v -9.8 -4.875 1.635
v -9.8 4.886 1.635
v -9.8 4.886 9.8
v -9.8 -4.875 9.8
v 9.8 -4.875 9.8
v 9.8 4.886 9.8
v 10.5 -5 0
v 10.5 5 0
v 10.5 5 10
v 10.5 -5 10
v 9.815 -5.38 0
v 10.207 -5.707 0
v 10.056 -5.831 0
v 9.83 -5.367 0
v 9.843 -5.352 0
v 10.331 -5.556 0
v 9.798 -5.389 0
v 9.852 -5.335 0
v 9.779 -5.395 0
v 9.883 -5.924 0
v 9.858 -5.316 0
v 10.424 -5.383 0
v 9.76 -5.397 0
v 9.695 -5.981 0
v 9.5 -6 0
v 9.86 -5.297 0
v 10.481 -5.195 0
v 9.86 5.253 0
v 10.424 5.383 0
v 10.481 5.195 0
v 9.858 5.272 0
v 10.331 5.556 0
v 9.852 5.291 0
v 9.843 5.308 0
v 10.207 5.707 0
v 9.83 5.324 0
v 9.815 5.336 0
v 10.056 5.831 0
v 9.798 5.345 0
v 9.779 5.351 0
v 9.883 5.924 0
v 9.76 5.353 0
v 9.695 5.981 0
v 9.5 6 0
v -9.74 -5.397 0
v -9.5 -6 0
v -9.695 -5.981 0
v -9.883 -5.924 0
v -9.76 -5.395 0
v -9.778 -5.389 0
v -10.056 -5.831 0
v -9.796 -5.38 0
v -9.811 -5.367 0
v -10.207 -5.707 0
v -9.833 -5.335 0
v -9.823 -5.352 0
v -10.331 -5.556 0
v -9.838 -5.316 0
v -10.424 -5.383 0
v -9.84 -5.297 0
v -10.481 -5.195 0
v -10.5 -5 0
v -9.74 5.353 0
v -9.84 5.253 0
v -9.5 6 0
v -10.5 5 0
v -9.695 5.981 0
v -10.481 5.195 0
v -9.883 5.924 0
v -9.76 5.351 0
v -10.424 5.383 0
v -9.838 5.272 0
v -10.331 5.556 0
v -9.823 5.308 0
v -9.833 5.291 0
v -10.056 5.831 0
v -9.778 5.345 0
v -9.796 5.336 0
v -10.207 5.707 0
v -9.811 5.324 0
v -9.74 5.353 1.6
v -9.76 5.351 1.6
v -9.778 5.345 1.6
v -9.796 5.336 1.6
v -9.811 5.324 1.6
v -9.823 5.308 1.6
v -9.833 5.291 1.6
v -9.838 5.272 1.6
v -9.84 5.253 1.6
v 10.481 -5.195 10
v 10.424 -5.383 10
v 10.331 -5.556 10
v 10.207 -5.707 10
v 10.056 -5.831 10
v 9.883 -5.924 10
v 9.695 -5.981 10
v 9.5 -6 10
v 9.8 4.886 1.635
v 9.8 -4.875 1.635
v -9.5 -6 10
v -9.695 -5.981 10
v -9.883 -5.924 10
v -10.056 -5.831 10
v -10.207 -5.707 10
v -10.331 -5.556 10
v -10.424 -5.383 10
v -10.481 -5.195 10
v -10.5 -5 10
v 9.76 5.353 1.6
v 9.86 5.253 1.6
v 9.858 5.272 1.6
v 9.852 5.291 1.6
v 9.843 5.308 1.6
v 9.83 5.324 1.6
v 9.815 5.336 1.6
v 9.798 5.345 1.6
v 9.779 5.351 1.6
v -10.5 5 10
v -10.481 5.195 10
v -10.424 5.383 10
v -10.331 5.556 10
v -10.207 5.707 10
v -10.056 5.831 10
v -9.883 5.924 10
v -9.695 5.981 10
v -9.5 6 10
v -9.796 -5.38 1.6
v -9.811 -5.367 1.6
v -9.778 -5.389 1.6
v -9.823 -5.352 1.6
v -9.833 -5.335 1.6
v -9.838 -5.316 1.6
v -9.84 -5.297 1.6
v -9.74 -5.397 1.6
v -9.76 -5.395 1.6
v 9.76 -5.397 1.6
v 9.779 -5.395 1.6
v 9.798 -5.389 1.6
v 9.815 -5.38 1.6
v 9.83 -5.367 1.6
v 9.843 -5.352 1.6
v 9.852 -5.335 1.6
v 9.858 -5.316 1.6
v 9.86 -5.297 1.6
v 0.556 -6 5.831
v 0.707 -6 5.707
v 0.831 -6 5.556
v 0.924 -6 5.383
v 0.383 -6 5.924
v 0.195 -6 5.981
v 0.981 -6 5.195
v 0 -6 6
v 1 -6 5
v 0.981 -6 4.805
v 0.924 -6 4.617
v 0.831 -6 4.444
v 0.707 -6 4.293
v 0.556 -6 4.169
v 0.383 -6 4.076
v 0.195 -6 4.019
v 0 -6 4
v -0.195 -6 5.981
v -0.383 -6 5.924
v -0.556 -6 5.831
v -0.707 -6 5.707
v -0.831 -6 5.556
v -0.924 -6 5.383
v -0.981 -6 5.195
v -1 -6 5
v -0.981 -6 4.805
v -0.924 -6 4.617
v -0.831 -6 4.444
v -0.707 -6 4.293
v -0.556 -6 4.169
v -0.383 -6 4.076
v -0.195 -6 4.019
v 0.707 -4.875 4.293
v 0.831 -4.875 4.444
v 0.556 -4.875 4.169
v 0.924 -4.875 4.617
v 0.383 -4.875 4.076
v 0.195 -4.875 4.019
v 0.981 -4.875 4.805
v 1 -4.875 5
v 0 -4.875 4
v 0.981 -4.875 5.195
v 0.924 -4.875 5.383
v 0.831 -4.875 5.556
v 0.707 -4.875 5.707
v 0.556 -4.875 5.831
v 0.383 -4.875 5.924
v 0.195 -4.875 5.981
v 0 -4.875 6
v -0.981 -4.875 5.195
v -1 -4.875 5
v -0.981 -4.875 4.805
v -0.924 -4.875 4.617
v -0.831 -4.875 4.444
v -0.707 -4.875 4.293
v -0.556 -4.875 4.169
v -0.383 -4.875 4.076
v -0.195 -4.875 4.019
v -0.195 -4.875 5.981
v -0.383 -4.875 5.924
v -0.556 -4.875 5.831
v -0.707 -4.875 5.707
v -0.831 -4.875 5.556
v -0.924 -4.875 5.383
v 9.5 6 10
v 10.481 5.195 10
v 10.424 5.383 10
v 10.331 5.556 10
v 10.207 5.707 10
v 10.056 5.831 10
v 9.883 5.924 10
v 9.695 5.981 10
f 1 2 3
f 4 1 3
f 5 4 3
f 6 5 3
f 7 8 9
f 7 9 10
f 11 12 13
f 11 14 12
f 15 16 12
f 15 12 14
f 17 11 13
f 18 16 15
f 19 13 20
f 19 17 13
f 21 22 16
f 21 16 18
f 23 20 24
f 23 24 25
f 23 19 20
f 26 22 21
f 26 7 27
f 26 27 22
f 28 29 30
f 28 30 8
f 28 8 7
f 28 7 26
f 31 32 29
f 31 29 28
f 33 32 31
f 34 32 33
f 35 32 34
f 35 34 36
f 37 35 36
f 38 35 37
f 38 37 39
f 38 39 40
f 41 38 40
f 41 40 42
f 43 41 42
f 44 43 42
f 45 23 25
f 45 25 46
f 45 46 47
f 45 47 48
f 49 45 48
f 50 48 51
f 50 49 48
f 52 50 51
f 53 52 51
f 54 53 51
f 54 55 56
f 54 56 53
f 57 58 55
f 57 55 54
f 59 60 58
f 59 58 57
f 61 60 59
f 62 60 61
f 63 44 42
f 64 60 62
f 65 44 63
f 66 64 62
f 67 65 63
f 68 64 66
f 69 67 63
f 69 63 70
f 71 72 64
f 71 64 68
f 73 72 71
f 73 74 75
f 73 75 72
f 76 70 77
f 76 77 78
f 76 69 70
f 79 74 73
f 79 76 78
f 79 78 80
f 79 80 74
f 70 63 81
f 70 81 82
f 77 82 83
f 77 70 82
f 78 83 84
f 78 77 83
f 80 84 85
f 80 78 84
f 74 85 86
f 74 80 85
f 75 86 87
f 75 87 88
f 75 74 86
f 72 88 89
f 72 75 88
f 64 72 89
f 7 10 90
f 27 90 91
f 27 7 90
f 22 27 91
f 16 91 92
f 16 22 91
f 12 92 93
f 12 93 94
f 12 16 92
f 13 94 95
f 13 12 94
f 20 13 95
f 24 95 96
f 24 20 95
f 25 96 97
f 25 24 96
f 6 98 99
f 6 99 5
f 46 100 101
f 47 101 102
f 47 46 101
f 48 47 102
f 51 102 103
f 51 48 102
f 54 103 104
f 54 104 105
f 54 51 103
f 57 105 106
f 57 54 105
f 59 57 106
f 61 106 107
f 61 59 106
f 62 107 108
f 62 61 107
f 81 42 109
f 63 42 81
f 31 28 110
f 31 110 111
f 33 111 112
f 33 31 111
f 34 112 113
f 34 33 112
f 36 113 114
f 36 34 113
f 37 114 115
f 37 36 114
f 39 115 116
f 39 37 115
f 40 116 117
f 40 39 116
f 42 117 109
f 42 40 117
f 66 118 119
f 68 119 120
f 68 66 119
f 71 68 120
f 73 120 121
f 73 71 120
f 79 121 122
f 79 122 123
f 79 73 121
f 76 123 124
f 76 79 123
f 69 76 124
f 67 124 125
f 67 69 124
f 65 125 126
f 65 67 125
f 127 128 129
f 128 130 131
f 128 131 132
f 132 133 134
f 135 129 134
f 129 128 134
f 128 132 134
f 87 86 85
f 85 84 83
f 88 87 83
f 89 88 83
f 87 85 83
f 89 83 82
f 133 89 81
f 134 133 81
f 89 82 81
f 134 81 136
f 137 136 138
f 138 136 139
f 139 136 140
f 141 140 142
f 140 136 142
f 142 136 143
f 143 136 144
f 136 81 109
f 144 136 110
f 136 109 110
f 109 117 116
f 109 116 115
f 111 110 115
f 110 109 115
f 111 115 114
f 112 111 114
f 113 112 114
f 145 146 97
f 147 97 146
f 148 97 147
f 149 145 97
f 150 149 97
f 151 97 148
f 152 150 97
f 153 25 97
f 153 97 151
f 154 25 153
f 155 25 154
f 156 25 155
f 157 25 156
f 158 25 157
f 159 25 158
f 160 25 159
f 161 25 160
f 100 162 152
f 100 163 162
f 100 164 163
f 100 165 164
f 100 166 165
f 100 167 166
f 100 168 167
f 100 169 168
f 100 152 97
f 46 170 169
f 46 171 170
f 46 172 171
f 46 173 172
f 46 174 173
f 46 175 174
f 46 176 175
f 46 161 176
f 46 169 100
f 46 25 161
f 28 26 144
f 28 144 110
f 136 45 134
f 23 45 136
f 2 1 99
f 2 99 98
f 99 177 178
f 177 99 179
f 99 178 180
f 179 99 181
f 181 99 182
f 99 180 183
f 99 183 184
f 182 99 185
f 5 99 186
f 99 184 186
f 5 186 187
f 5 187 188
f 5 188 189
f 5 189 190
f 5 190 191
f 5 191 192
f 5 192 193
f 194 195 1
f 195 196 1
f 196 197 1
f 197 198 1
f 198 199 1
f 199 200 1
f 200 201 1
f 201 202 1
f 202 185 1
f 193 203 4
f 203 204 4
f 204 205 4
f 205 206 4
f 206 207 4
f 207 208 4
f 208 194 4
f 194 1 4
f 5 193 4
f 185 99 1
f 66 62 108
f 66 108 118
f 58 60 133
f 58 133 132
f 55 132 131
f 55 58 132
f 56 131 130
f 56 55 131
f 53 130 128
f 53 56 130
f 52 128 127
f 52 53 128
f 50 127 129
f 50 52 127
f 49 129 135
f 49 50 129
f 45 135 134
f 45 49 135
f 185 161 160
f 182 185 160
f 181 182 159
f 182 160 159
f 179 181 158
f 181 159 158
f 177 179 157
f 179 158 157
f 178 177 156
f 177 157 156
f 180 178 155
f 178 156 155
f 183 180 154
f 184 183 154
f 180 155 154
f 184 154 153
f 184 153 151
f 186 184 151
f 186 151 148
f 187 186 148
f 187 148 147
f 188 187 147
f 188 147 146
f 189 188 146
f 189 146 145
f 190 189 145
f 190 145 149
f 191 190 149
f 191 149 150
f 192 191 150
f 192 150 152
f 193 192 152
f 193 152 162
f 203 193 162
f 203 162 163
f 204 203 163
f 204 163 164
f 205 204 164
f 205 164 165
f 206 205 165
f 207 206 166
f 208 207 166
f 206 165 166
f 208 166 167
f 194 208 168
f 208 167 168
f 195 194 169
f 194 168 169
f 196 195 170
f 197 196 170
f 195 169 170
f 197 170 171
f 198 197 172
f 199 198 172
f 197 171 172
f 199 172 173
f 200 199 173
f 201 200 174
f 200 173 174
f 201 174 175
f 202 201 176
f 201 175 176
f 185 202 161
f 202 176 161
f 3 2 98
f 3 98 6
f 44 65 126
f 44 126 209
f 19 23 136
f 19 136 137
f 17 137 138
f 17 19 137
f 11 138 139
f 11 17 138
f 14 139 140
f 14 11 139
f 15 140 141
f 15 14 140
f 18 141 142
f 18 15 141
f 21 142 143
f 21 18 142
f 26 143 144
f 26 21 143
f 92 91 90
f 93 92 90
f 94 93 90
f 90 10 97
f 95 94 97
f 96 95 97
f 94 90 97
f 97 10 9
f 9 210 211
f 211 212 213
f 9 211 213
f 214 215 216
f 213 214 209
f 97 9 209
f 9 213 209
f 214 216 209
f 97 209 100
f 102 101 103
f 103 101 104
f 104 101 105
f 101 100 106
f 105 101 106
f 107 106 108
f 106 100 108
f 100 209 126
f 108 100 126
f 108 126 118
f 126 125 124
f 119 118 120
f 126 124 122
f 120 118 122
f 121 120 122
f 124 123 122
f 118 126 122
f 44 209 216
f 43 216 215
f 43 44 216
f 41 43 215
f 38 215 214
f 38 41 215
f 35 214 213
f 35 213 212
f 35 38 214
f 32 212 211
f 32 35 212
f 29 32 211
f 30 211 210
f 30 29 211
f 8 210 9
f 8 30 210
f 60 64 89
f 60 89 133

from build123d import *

# Parameters (mm, degrees)
BOSS_EXTRUDE2_DEPTH = 10
CUT_EXTRUDE3_DEPTH  = 1.6
SKETCH5_W           = 8.164929968
SKETCH5_H           = 9.761243885
CUT_EXTRUDE4_DEPTH  = 19.6
SKETCH6_R           = 1
CUT_EXTRUDE5_DEPTH  = 5


with BuildPart() as part:
    # Sketch2 → Boss-Extrude2 (new body)
    with BuildSketch(Plane.XY):
        with BuildLine():
            Line((-9.5, 6), (9.5, 6))
            ThreePointArc((9.5, 6), (10.207106781, 5.707106781), (10.5, 5))
            Line((10.5, 5), (10.5, -5))
            ThreePointArc((10.5, -5), (10.207106781, -5.707106781), (9.5, -6))
            Line((9.5, -6), (-9.5, -6))
            ThreePointArc((-9.5, -6), (-10.207106781, -5.707106781), (-10.5, -5))
            Line((-10.5, -5), (-10.5, 5))
            ThreePointArc((-10.5, 5), (-10.207106781, 5.707106781), (-9.5, 6))
        make_face()
    extrude(amount=BOSS_EXTRUDE2_DEPTH)

    # Sketch4 → Cut-Extrude3 (cut)
    with BuildSketch(Plane(origin=(0, 0, 0), x_dir=(-1, 0, 0), z_dir=(0, 0, -1))):
        with BuildLine():
            Line((-9.759787833, 5.35287298), (9.740212167, 5.35287298))
            ThreePointArc((9.740212167, 5.35287298), (9.810922845, 5.323583659), (9.840212167, 5.25287298))
            Line((9.840212167, 5.25287298), (9.840212167, -5.296629435))
            ThreePointArc((9.840212167, -5.296629435), (9.810922845, -5.367340113), (9.740212167, -5.396629435))
            Line((9.740212167, -5.396629435), (-9.759787833, -5.396629435))
            ThreePointArc((-9.759787833, -5.396629435), (-9.830498511, -5.367340113), (-9.859787833, -5.296629435))
            Line((-9.859787833, -5.296629435), (-9.859787833, 5.25287298))
            ThreePointArc((-9.859787833, 5.25287298), (-9.830498511, 5.323583659), (-9.759787833, 5.35287298))
        make_face()
    extrude(amount=-CUT_EXTRUDE3_DEPTH, mode=Mode.SUBTRACT)

    # Sketch5 → Cut-Extrude4 (cut)
    with BuildSketch(Plane.ZY.offset(9.8)):
        with Locations((5.717262672, 0.005392953)):
            Rectangle(SKETCH5_W, SKETCH5_H)
    extrude(amount=-CUT_EXTRUDE4_DEPTH, mode=Mode.SUBTRACT)

    # Sketch6 → Cut-Extrude5 (cut)
    with BuildSketch(Plane.XZ.offset(6)):
        with Locations(Location((0, 5, 0), (0, 0, 270))):
            Circle(SKETCH6_R)
    extrude(amount=-CUT_EXTRUDE5_DEPTH, mode=Mode.SUBTRACT)


solid = part.part
